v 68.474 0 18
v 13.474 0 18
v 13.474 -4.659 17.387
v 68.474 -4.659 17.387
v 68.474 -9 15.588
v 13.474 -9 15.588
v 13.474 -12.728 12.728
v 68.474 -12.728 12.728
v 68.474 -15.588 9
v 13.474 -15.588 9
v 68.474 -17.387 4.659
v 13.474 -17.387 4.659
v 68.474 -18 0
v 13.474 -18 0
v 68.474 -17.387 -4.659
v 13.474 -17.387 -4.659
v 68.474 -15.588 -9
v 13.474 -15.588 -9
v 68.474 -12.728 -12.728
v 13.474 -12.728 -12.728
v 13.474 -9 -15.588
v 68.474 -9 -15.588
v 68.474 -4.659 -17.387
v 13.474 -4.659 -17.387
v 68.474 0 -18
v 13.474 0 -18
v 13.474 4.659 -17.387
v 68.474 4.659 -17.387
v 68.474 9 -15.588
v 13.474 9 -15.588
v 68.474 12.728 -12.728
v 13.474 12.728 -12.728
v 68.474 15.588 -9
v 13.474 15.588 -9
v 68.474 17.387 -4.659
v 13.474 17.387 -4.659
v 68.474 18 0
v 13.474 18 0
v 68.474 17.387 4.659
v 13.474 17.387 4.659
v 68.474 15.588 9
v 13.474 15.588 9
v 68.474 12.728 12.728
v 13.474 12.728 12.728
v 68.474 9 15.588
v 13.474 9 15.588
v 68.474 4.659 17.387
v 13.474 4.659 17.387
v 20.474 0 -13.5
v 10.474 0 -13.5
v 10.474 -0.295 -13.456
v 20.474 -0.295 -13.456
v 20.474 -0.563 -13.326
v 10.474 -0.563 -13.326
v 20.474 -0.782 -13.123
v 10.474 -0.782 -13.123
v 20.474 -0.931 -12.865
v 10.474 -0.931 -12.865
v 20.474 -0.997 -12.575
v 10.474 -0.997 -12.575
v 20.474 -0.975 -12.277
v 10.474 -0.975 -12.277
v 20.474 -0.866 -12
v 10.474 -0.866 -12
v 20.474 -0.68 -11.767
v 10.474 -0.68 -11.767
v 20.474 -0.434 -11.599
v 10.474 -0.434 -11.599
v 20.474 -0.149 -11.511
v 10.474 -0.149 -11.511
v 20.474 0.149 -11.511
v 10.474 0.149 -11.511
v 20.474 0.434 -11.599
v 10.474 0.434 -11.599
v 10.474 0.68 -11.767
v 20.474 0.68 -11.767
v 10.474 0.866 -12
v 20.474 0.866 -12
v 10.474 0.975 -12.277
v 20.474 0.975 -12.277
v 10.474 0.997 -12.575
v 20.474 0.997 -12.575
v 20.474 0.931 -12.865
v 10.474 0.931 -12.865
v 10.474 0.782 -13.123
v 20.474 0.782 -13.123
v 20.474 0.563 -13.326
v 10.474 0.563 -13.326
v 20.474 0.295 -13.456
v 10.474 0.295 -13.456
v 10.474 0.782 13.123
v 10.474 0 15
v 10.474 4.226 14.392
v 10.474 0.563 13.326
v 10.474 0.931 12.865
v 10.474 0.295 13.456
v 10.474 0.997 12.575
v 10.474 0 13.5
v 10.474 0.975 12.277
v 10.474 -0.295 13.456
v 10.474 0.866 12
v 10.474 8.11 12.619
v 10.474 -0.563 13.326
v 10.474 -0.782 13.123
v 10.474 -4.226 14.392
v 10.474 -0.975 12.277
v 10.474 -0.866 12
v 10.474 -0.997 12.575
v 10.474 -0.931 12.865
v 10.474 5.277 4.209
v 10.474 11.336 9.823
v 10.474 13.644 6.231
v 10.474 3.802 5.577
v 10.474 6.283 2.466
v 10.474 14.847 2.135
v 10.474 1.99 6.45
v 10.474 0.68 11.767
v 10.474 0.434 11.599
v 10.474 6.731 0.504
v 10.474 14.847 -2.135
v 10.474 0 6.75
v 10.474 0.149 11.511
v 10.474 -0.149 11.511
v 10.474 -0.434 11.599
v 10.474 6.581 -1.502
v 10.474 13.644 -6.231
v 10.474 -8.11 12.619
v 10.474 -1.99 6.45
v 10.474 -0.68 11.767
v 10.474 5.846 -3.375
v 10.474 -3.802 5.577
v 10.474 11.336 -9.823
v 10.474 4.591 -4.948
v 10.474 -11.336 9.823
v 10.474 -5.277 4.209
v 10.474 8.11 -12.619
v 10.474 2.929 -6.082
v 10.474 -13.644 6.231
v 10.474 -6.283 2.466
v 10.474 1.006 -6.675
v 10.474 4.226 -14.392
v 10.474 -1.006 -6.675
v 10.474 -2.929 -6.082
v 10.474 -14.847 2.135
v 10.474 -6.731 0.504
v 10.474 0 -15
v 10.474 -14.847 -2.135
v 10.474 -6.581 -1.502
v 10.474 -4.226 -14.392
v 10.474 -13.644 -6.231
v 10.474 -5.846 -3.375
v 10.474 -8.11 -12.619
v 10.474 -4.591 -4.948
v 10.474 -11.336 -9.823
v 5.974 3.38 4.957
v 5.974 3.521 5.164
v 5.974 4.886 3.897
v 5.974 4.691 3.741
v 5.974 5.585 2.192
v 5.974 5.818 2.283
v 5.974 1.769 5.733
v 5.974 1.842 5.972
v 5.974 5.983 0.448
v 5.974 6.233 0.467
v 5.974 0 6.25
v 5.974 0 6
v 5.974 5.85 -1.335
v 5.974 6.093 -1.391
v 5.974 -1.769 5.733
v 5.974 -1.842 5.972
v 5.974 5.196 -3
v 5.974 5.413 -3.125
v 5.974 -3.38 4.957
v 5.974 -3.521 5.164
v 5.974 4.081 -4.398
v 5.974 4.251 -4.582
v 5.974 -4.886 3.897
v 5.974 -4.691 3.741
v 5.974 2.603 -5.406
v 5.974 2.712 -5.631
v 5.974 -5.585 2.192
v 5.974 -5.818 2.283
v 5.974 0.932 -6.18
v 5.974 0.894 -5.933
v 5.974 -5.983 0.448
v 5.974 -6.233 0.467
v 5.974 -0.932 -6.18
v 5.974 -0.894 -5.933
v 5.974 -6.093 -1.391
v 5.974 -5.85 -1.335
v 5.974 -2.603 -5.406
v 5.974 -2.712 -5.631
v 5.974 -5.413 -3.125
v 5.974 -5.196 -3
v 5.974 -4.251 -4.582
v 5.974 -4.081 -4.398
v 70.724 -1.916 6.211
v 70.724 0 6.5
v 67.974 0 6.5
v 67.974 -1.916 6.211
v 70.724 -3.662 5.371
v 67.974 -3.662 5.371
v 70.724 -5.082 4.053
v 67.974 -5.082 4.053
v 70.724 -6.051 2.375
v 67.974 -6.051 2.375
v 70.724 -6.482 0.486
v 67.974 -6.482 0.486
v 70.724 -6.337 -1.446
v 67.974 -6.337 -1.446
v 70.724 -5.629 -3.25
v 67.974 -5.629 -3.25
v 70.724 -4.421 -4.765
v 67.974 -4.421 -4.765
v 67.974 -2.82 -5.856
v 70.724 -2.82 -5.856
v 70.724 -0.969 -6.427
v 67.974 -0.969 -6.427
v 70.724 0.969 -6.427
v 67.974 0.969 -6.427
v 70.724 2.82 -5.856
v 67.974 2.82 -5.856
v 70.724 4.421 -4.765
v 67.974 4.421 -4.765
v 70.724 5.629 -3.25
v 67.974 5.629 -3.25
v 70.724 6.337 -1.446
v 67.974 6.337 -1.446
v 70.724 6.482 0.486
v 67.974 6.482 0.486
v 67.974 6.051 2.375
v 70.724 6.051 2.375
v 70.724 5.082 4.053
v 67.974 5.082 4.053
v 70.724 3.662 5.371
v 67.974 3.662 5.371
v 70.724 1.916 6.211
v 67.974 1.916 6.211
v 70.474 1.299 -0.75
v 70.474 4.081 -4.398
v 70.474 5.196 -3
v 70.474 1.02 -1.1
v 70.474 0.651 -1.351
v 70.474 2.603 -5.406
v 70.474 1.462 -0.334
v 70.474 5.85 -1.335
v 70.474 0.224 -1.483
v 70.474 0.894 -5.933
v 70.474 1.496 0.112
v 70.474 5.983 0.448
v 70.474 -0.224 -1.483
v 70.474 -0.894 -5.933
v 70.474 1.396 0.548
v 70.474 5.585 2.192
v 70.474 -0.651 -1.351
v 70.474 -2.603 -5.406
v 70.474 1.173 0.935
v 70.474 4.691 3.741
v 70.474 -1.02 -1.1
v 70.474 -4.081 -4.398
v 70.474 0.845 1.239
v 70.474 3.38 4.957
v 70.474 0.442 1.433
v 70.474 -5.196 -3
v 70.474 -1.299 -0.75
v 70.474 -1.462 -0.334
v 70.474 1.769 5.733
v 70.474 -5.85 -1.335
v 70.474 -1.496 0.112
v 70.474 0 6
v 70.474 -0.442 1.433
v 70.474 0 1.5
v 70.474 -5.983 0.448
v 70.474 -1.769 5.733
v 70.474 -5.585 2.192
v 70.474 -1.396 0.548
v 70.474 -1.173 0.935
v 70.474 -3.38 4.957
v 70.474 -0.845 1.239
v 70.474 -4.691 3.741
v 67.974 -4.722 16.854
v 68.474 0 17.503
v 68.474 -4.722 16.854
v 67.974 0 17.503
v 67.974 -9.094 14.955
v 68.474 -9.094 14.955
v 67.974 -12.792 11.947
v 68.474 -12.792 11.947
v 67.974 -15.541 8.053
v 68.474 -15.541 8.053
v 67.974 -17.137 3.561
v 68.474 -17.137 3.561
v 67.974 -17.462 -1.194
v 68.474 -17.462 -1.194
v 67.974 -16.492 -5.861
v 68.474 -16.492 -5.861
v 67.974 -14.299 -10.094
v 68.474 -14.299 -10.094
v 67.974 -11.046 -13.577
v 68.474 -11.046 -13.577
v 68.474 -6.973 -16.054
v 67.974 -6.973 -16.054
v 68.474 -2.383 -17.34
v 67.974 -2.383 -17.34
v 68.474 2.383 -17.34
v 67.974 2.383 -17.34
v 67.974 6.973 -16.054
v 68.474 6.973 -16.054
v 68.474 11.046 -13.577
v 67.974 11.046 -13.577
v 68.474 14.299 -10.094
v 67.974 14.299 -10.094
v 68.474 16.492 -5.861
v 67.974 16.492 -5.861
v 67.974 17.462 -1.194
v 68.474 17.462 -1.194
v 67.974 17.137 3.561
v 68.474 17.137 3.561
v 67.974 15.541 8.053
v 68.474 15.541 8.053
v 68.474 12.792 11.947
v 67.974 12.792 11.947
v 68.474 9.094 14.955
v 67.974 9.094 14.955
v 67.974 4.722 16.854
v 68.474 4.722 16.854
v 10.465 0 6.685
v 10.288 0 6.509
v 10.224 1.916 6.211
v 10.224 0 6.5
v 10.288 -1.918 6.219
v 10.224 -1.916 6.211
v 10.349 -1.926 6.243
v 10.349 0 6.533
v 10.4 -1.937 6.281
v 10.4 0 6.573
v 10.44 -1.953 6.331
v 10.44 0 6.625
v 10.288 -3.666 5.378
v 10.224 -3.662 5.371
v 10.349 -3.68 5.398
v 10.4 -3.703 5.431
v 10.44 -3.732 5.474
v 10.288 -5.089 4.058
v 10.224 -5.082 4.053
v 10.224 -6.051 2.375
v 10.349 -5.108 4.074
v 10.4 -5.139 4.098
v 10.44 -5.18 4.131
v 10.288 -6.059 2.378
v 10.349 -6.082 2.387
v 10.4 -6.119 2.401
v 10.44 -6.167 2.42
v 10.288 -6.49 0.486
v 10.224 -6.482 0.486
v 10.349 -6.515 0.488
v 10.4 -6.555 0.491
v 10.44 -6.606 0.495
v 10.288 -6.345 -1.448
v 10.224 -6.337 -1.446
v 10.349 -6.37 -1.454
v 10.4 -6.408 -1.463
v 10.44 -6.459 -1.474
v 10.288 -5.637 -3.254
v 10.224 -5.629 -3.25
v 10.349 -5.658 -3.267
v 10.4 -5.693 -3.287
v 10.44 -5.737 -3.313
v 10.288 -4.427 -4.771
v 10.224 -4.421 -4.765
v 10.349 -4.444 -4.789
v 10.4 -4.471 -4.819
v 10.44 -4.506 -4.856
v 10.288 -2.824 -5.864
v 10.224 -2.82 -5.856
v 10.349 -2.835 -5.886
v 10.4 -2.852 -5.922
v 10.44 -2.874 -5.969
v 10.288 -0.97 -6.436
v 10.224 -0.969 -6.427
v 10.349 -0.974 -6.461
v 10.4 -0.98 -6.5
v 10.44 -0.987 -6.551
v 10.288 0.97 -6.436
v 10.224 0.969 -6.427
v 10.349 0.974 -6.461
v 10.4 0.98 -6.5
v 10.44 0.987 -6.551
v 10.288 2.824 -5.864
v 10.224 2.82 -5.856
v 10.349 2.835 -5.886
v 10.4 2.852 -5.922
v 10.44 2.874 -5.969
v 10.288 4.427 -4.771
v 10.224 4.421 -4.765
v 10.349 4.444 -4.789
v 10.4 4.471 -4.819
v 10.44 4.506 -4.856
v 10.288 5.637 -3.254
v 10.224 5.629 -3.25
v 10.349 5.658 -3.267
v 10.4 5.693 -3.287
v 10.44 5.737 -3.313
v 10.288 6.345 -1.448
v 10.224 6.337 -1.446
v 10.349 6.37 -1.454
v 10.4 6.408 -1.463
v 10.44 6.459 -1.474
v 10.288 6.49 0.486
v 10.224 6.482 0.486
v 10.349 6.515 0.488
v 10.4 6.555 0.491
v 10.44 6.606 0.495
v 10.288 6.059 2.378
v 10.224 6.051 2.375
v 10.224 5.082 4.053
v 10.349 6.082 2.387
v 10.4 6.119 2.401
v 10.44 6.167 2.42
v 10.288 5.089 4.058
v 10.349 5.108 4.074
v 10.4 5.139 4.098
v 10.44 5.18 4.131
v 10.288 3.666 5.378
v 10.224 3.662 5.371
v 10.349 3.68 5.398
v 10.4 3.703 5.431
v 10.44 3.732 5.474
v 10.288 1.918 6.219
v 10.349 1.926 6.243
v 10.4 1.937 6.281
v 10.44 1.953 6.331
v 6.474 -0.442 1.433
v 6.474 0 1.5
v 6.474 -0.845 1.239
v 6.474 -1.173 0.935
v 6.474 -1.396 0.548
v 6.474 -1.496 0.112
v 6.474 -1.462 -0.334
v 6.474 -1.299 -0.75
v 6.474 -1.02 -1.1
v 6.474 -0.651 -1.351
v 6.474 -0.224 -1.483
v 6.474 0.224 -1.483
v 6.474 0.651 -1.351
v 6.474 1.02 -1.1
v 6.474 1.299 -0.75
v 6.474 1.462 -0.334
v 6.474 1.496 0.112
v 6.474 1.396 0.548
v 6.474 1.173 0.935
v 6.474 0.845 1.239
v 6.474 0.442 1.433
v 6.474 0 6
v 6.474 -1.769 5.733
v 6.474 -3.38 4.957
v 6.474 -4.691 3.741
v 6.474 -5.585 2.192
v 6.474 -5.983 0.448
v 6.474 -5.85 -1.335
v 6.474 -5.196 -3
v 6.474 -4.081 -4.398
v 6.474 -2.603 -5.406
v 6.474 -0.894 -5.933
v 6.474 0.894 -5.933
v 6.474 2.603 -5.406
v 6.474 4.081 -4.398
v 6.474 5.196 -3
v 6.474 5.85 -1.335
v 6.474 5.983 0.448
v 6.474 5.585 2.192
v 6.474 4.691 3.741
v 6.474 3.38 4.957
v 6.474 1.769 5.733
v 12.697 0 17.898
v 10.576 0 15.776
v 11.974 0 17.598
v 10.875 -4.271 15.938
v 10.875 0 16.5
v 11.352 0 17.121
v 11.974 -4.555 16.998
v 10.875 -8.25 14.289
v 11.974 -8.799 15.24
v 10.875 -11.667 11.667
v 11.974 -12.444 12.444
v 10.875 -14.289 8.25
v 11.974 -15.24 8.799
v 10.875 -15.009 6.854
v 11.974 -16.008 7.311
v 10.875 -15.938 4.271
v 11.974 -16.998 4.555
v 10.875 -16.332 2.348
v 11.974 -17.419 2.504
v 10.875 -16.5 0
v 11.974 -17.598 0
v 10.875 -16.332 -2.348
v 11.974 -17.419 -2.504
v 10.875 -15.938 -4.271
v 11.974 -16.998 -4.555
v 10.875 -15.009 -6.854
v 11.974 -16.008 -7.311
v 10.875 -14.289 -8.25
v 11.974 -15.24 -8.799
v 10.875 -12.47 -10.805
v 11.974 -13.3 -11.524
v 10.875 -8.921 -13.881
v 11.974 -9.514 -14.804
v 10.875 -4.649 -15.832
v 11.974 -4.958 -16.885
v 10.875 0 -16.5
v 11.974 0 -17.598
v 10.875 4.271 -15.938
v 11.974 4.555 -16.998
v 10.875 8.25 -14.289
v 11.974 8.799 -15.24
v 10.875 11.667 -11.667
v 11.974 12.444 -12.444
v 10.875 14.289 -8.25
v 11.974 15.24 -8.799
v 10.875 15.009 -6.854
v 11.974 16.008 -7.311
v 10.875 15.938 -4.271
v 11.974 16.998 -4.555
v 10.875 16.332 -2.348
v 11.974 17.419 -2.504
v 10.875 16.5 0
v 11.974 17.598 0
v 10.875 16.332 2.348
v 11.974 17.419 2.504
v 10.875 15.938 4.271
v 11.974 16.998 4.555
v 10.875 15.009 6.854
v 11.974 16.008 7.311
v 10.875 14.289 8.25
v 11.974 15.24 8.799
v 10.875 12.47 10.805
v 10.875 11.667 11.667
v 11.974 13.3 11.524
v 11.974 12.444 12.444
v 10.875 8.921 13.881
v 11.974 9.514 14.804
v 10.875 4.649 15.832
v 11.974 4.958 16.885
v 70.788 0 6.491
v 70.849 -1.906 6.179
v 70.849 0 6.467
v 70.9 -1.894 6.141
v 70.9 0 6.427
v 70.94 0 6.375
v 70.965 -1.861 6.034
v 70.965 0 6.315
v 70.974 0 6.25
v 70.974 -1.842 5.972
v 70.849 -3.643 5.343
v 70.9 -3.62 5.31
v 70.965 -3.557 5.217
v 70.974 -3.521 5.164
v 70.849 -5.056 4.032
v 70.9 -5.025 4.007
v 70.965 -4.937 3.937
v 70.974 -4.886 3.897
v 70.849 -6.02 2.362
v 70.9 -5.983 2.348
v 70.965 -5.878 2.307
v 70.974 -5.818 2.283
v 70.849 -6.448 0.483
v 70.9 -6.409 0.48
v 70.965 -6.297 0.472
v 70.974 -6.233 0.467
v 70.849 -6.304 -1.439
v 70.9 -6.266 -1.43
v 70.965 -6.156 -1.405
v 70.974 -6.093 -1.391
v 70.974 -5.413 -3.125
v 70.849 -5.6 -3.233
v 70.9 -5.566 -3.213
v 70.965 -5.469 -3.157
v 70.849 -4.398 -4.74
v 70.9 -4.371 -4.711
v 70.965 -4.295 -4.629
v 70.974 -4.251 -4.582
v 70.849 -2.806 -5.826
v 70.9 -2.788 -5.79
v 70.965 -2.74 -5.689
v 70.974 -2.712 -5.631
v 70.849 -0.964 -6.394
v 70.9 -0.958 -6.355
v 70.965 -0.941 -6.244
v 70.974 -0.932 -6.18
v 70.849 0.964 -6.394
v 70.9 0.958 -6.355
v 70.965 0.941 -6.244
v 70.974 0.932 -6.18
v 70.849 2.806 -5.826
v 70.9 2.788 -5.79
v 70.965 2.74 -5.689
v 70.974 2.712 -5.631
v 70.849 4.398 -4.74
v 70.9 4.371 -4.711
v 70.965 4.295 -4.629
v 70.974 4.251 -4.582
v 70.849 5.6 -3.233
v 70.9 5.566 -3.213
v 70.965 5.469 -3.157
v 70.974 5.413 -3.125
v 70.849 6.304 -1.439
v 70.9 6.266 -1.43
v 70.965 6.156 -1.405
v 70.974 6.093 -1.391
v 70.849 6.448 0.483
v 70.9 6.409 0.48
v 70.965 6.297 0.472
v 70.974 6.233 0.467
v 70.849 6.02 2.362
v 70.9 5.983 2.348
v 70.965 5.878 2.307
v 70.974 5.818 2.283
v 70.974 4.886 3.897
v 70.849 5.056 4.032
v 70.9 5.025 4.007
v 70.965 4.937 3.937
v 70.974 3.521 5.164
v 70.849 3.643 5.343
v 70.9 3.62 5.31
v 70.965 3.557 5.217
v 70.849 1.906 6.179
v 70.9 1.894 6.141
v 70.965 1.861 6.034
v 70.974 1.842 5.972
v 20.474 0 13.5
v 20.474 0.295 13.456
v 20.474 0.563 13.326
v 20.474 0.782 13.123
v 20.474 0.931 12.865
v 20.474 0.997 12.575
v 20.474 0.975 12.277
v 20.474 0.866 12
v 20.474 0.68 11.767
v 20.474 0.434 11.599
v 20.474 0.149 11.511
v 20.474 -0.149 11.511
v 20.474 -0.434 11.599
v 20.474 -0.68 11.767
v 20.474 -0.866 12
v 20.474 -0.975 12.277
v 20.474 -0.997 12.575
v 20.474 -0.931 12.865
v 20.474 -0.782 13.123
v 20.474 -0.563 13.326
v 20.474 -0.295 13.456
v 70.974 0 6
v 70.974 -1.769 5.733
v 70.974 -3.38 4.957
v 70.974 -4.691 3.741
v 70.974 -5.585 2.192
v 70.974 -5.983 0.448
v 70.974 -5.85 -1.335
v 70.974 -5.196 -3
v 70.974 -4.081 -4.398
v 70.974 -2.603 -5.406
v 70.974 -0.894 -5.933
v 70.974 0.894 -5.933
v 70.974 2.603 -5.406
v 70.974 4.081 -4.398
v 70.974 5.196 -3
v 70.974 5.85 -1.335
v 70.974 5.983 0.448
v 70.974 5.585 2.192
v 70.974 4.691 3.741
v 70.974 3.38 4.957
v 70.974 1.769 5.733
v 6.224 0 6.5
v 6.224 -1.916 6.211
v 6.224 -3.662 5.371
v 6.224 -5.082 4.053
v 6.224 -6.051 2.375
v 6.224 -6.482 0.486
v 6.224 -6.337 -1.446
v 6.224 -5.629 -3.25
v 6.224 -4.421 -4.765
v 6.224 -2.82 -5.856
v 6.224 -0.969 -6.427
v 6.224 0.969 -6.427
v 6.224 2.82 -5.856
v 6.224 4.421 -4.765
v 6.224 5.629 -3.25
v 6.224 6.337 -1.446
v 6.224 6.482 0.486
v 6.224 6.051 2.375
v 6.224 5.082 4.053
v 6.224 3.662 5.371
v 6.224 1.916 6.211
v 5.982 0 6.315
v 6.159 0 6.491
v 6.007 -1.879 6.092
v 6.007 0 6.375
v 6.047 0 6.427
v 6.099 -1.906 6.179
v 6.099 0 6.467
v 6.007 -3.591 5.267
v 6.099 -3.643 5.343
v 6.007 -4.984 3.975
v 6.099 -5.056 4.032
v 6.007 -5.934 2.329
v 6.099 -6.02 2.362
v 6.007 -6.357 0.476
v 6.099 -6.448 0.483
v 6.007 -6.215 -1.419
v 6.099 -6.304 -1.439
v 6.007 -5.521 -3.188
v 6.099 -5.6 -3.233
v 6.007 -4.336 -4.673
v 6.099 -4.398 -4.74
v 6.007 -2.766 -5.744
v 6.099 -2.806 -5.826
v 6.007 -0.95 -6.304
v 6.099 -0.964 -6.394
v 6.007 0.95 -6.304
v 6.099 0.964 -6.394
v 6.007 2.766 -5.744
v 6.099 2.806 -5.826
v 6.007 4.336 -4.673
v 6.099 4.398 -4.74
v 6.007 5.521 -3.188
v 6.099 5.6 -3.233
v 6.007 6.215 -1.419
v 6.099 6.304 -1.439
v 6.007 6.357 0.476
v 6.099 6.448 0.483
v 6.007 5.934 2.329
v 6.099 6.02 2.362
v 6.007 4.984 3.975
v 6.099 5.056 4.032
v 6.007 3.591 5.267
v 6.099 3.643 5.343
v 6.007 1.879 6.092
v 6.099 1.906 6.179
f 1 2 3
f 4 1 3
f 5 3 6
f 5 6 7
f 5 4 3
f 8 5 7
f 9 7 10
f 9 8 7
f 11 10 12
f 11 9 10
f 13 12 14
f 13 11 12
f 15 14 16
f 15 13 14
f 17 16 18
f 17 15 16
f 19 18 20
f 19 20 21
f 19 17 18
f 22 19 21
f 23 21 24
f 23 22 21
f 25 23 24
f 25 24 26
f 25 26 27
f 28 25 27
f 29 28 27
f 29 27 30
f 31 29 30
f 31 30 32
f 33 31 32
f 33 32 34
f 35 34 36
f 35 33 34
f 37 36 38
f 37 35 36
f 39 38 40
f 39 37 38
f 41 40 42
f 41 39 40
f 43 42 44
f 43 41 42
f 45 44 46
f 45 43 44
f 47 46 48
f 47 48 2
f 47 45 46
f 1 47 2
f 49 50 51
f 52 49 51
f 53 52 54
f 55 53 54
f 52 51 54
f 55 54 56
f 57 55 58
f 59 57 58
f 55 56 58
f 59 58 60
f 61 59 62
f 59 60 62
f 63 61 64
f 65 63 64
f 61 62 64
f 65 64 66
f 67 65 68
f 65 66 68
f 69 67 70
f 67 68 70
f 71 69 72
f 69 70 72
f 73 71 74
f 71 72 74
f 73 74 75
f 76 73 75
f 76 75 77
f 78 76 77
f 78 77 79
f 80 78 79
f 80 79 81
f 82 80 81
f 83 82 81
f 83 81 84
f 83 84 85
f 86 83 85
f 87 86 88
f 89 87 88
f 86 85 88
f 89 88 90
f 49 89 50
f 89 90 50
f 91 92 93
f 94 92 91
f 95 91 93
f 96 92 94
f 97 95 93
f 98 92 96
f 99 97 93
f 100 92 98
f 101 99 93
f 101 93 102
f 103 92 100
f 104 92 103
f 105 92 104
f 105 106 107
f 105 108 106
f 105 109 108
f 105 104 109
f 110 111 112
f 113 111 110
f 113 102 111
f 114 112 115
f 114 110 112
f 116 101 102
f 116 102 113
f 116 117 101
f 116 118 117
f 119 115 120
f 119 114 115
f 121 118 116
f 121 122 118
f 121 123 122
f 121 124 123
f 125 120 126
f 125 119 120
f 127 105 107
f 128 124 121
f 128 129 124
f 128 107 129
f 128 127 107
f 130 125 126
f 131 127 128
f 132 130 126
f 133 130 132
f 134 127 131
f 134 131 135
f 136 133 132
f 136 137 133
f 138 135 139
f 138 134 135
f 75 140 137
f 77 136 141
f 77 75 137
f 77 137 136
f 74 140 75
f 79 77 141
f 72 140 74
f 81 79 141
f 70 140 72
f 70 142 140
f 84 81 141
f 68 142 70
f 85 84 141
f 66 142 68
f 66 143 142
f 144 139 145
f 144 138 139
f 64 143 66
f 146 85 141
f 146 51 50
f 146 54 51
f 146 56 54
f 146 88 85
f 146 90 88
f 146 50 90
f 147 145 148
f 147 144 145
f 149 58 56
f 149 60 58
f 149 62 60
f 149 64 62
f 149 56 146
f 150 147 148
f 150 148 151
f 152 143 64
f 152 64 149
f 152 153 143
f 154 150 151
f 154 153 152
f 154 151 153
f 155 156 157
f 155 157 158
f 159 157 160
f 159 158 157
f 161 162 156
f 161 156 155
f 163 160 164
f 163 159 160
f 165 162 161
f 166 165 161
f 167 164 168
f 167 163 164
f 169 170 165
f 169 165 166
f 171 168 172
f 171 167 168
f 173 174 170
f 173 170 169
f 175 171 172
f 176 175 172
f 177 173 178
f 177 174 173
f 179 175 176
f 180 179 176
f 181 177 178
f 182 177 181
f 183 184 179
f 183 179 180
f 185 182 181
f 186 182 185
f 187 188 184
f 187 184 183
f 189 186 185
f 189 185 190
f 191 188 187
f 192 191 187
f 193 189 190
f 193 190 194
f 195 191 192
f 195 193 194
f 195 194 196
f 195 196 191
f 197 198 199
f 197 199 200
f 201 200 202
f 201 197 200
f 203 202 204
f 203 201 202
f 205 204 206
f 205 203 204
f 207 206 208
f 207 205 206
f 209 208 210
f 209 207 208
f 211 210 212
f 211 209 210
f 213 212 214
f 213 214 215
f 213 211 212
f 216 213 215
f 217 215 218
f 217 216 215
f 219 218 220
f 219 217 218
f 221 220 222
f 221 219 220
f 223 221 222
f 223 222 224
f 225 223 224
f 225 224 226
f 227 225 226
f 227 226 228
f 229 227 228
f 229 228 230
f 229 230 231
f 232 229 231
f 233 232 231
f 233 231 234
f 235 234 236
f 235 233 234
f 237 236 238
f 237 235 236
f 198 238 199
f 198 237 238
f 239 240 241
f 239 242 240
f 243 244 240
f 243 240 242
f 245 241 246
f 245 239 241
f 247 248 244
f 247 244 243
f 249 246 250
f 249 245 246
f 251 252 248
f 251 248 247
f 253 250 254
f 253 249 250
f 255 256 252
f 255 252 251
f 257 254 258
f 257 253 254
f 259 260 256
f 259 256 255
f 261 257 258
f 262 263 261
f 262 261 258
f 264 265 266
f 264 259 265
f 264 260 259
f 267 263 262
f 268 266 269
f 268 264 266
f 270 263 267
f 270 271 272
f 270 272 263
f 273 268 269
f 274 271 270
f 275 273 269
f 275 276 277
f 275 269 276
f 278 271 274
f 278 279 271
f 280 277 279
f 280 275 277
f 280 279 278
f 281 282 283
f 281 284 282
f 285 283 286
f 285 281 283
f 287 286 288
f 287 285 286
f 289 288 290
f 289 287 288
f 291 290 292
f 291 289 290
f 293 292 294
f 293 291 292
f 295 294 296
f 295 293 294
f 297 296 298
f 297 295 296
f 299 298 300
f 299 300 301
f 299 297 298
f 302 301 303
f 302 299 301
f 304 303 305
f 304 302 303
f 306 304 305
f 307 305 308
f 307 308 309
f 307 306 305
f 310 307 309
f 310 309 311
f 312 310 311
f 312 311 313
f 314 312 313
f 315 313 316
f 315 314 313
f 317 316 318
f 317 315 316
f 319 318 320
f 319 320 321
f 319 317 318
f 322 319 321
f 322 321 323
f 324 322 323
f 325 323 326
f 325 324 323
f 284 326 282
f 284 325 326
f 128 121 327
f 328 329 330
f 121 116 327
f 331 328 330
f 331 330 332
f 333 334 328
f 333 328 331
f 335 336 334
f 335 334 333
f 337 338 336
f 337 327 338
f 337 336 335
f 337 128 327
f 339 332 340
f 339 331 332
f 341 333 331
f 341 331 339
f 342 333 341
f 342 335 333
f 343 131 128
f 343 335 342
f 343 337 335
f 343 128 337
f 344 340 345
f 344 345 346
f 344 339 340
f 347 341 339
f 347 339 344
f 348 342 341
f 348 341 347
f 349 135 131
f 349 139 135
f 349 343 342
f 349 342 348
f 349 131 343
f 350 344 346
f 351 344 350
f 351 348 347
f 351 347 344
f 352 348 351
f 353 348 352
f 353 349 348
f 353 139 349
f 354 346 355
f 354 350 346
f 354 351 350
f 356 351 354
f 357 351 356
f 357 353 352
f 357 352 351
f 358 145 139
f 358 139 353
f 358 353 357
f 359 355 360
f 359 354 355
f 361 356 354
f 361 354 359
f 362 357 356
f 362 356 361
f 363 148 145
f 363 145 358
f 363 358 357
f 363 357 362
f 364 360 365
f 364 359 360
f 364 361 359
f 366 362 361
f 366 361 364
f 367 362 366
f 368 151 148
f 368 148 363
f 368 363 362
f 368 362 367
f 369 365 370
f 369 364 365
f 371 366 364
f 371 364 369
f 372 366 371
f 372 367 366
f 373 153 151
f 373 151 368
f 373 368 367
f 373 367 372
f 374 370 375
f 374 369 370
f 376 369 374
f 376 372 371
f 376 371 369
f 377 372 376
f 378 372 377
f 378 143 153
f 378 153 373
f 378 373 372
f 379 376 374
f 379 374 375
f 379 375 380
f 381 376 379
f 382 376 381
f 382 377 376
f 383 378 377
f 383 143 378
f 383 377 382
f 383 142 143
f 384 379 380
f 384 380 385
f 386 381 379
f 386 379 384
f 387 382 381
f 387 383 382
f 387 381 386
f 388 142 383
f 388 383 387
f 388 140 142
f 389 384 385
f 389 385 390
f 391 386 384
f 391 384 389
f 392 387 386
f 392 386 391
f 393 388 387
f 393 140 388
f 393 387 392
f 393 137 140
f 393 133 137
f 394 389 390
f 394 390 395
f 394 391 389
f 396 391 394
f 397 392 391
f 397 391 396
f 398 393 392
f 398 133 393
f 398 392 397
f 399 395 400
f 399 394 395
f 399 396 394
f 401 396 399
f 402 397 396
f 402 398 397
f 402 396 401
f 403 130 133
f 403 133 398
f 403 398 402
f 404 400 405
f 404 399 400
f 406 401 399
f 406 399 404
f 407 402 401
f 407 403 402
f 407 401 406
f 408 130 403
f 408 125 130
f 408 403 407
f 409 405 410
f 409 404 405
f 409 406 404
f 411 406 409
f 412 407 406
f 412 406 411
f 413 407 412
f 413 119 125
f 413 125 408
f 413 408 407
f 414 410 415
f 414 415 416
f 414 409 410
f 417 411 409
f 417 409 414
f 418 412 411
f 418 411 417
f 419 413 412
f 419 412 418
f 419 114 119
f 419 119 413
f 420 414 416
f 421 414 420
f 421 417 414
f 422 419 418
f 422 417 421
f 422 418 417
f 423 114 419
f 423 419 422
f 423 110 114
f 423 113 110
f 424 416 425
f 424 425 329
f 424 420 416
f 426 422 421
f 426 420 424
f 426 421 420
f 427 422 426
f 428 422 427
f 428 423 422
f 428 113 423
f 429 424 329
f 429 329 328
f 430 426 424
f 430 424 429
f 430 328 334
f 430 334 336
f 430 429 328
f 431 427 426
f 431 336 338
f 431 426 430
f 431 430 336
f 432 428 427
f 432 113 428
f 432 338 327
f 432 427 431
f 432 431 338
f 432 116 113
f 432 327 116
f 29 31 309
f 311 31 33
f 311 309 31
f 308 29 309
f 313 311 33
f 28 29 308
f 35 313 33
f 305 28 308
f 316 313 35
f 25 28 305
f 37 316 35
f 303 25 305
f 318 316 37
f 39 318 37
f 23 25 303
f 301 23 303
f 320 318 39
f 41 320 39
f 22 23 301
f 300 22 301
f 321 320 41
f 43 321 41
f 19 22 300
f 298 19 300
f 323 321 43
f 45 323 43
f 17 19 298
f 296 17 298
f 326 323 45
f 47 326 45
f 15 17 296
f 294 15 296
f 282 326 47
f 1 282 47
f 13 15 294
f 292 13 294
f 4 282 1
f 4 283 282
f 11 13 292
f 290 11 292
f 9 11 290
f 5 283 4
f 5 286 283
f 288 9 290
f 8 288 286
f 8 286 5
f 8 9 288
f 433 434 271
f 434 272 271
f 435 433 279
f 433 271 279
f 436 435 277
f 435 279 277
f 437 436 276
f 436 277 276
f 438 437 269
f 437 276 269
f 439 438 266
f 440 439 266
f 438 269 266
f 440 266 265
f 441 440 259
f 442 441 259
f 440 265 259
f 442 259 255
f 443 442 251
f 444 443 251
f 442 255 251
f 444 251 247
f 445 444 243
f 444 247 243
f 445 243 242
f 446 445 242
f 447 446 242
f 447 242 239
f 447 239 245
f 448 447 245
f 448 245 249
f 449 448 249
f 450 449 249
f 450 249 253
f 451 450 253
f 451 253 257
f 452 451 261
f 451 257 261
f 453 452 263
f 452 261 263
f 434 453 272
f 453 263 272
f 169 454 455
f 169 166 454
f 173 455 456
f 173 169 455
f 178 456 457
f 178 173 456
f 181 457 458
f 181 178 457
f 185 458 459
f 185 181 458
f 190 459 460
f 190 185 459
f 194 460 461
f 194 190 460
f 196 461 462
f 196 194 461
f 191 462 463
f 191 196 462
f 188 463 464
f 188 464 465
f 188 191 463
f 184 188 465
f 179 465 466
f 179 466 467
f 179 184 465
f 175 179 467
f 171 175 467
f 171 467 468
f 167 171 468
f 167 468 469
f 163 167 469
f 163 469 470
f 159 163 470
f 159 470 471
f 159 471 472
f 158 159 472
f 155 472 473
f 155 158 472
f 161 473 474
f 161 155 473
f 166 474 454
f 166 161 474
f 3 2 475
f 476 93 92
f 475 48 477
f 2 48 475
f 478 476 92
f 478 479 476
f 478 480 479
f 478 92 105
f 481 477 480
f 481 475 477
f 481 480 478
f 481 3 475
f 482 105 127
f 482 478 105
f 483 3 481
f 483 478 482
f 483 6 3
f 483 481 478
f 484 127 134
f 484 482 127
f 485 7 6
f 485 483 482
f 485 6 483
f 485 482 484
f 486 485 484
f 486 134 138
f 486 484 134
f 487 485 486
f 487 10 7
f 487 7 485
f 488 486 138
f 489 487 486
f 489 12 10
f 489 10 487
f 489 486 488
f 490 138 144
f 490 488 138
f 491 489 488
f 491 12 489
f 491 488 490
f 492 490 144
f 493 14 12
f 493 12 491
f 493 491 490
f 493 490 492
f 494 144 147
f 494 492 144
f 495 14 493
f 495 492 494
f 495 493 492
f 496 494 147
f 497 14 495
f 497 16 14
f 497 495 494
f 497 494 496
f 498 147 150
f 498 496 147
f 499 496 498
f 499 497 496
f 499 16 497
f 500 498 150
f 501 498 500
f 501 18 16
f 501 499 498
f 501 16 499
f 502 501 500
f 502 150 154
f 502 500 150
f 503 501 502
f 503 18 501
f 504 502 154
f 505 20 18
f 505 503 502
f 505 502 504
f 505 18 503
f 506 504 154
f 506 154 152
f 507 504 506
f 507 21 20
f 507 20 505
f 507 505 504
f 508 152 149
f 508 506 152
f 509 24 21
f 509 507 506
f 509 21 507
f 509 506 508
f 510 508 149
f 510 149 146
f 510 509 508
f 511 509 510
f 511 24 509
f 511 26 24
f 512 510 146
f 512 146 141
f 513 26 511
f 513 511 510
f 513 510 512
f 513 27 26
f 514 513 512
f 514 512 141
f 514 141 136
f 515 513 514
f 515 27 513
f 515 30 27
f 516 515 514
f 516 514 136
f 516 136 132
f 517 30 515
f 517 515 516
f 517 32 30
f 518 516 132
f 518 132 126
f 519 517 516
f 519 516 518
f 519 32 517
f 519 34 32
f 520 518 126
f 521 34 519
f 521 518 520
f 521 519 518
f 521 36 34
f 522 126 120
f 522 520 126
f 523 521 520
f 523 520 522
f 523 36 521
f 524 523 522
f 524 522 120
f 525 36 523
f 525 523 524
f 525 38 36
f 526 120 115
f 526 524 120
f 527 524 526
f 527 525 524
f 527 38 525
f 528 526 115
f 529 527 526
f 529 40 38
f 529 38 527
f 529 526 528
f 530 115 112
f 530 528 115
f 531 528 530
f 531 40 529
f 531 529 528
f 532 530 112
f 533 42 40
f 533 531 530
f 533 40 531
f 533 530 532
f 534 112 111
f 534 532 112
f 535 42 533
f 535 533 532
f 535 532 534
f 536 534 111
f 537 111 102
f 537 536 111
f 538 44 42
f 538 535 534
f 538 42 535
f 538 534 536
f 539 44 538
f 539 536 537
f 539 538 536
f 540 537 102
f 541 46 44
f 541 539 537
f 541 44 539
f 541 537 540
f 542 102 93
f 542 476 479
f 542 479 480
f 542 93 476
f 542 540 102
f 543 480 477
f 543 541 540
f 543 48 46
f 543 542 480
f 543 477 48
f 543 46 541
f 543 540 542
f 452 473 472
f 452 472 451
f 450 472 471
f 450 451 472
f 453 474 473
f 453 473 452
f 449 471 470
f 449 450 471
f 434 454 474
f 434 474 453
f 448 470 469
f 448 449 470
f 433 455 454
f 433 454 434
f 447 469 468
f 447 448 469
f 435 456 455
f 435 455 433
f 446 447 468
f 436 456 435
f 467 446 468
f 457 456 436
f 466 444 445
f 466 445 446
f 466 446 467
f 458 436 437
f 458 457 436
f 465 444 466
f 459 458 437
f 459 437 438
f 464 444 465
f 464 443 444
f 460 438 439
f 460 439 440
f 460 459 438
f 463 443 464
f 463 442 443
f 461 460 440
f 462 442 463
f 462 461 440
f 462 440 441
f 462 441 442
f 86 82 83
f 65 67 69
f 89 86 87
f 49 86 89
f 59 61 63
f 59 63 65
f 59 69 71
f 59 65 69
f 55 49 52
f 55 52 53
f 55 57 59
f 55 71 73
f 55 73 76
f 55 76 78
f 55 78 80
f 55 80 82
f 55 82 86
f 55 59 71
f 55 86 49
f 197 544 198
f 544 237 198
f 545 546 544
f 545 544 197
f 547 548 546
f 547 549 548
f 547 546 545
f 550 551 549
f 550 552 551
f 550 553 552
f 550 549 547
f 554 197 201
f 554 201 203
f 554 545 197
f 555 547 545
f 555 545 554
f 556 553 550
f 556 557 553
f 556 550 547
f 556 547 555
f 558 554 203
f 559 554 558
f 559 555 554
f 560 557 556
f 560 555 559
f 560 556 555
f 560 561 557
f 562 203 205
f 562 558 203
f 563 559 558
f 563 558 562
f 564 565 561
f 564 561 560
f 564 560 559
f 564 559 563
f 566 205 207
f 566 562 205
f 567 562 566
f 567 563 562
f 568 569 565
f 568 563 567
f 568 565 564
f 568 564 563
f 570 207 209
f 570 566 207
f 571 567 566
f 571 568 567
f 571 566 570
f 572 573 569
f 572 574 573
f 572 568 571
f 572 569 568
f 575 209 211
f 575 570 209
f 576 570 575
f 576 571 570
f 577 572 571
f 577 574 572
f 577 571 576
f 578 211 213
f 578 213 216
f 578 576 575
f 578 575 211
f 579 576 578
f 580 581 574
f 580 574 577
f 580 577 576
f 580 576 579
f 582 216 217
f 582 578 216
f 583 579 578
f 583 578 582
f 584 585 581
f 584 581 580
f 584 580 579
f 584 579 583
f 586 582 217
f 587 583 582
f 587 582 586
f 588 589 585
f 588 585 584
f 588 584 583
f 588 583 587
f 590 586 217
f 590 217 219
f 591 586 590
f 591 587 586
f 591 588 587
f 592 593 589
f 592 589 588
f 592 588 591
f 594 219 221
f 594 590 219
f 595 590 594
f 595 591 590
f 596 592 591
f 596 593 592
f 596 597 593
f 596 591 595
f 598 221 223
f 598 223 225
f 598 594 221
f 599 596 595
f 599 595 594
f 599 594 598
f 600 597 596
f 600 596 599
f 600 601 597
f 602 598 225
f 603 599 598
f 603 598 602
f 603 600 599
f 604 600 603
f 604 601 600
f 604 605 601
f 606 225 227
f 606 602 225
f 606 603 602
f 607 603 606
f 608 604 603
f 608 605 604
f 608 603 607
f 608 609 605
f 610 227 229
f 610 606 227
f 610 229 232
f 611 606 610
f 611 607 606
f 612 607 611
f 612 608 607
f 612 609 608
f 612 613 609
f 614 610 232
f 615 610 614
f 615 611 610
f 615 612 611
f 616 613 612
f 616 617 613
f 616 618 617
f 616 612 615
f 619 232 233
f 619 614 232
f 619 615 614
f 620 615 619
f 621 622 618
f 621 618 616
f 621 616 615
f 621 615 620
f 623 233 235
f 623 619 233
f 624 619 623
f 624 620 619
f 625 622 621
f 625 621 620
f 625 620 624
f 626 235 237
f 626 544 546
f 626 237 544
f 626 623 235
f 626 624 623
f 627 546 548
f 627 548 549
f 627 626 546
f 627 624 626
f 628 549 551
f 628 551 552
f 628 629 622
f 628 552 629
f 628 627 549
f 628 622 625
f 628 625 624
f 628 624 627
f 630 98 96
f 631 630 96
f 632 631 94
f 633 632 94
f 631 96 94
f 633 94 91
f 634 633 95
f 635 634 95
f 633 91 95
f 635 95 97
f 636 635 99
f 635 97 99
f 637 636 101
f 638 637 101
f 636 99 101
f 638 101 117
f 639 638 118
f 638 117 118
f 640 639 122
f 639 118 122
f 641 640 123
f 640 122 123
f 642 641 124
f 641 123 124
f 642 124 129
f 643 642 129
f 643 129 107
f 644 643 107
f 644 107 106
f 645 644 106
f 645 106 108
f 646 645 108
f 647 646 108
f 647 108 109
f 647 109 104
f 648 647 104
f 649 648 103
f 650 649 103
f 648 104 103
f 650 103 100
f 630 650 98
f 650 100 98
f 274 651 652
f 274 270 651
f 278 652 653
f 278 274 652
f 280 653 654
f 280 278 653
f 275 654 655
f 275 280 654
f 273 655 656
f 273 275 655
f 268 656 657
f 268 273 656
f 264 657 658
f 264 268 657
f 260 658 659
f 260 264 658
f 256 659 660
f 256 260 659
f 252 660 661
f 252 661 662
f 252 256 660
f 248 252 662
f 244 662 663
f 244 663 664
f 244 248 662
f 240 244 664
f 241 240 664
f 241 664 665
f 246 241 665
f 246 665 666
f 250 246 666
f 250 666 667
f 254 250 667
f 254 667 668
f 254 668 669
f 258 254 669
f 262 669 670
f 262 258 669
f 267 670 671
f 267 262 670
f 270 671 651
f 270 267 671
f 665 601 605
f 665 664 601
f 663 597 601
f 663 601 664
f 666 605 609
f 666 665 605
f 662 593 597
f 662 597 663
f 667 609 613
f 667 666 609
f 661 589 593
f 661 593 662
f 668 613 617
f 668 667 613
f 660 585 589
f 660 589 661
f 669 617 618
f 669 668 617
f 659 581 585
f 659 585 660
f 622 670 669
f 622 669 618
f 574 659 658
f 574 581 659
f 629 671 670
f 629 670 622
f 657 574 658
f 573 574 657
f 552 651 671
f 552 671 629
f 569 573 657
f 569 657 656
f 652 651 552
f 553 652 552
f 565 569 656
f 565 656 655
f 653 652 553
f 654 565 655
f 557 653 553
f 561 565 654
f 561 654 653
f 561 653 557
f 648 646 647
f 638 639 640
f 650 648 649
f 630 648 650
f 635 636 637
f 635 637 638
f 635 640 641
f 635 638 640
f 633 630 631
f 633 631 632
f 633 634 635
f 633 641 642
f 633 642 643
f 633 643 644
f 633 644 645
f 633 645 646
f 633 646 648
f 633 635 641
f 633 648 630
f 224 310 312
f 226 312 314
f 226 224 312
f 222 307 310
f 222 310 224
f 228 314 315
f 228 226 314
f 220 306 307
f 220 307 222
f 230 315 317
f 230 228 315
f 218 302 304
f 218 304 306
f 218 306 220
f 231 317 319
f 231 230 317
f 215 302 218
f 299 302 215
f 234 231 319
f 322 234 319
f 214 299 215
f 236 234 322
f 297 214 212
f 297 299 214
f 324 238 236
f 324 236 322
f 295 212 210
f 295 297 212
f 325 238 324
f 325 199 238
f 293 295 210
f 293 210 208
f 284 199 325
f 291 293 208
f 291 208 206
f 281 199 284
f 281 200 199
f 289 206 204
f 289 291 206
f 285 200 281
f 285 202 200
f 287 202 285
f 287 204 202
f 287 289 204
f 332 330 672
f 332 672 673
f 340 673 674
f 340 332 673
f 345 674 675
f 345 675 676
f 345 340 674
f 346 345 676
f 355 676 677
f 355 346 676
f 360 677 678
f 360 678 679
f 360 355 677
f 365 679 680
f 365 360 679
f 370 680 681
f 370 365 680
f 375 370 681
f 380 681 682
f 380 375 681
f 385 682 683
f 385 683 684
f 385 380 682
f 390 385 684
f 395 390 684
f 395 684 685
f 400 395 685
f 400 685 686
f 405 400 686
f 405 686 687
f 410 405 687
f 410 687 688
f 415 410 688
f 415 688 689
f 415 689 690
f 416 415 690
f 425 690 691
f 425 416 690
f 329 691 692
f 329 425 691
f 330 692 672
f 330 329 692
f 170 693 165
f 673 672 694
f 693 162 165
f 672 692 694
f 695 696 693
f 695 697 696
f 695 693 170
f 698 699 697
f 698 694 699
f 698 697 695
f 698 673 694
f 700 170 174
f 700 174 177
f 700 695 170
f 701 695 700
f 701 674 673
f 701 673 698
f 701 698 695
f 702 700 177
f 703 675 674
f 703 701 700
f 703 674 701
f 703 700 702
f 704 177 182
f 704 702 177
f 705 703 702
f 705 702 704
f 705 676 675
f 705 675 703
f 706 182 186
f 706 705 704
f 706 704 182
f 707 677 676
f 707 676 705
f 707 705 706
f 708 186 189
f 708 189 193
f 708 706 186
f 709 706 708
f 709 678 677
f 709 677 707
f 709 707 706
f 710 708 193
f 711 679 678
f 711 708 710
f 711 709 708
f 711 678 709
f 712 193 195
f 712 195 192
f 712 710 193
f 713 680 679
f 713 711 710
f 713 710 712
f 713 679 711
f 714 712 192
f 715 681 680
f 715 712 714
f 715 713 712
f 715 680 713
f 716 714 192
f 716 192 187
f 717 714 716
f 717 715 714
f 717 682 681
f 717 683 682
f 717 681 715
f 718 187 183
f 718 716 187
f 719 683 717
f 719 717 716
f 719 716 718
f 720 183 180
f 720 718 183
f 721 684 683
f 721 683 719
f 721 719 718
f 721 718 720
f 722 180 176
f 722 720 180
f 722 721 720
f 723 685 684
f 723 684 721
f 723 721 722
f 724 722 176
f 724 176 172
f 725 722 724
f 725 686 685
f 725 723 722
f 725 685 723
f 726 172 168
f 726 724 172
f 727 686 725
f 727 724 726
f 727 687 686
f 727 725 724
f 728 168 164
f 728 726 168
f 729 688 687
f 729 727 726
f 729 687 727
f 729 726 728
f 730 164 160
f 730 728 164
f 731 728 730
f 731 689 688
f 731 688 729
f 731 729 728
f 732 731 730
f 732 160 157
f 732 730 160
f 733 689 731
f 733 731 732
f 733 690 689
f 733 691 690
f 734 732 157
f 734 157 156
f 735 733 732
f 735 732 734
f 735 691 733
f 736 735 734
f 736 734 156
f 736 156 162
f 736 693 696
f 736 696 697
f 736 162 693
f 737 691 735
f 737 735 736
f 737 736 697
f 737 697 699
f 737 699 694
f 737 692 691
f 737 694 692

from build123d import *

# Parameters (mm, degrees)
CONG_1_R                = 0.25
CONG_2_R                = 3
ESQUISSE2_R             = 1
ENL_V_MAT_EXTRU_1_DEPTH = 10


with BuildPart() as part:
    # Esquisse1 → Révolution1 (revolve)
    with BuildSketch(Plane.XY, mode=Mode.PRIVATE) as r_volution1_sk:
        Polygon((15.571393841, 1.5), (6.47350081, 1.5), (6.47350081, 6), (5.97350081, 6), (5.97350081, 6.5), (10.47350081, 6.5), (10.47350081, 18), (68.47350081, 18), (68.47350081, 17.502971724), (67.97350081, 17.502971724), (67.97350081, 6.5), (70.97350081, 6.5), (70.97350081, 6), (70.47350081, 6), (70.47350081, 1.5), align=None)
    revolve(r_volution1_sk.sketch.rotate(Axis((0, 0, 0), (1, 0, 0)), 90), axis=Axis((0, 0, 0), (1, 0, 0)))

    # Congé1
    cong_1_edges = [part.edges().sort_by_distance(p)[0] for p in [
        (70.97350081, 0, -6.5),
        (10.47350081, 0, -6.5),
        (5.97350081, 0, -6.5),
    ]]
    fillet(cong_1_edges, radius=CONG_1_R)

    # Congé2
    cong_2_edges = [part.edges().sort_by_distance(p)[0] for p in [
        (10.47350081, 0, -18),
    ]]
    fillet(cong_2_edges, radius=CONG_2_R)

    # Esquisse2 → Enlèv. mat.-Extru.1 (cut)
    with BuildSketch(Plane.ZY.offset(-10.47350081)):
        with Locations((12.5, 0)):
            Circle(ESQUISSE2_R)
        with Locations(Location((-12.5, 0, 0), (0, 0, 180))):
            Circle(ESQUISSE2_R)
    extrude(amount=-ENL_V_MAT_EXTRU_1_DEPTH, mode=Mode.SUBTRACT)


solid = part.part
